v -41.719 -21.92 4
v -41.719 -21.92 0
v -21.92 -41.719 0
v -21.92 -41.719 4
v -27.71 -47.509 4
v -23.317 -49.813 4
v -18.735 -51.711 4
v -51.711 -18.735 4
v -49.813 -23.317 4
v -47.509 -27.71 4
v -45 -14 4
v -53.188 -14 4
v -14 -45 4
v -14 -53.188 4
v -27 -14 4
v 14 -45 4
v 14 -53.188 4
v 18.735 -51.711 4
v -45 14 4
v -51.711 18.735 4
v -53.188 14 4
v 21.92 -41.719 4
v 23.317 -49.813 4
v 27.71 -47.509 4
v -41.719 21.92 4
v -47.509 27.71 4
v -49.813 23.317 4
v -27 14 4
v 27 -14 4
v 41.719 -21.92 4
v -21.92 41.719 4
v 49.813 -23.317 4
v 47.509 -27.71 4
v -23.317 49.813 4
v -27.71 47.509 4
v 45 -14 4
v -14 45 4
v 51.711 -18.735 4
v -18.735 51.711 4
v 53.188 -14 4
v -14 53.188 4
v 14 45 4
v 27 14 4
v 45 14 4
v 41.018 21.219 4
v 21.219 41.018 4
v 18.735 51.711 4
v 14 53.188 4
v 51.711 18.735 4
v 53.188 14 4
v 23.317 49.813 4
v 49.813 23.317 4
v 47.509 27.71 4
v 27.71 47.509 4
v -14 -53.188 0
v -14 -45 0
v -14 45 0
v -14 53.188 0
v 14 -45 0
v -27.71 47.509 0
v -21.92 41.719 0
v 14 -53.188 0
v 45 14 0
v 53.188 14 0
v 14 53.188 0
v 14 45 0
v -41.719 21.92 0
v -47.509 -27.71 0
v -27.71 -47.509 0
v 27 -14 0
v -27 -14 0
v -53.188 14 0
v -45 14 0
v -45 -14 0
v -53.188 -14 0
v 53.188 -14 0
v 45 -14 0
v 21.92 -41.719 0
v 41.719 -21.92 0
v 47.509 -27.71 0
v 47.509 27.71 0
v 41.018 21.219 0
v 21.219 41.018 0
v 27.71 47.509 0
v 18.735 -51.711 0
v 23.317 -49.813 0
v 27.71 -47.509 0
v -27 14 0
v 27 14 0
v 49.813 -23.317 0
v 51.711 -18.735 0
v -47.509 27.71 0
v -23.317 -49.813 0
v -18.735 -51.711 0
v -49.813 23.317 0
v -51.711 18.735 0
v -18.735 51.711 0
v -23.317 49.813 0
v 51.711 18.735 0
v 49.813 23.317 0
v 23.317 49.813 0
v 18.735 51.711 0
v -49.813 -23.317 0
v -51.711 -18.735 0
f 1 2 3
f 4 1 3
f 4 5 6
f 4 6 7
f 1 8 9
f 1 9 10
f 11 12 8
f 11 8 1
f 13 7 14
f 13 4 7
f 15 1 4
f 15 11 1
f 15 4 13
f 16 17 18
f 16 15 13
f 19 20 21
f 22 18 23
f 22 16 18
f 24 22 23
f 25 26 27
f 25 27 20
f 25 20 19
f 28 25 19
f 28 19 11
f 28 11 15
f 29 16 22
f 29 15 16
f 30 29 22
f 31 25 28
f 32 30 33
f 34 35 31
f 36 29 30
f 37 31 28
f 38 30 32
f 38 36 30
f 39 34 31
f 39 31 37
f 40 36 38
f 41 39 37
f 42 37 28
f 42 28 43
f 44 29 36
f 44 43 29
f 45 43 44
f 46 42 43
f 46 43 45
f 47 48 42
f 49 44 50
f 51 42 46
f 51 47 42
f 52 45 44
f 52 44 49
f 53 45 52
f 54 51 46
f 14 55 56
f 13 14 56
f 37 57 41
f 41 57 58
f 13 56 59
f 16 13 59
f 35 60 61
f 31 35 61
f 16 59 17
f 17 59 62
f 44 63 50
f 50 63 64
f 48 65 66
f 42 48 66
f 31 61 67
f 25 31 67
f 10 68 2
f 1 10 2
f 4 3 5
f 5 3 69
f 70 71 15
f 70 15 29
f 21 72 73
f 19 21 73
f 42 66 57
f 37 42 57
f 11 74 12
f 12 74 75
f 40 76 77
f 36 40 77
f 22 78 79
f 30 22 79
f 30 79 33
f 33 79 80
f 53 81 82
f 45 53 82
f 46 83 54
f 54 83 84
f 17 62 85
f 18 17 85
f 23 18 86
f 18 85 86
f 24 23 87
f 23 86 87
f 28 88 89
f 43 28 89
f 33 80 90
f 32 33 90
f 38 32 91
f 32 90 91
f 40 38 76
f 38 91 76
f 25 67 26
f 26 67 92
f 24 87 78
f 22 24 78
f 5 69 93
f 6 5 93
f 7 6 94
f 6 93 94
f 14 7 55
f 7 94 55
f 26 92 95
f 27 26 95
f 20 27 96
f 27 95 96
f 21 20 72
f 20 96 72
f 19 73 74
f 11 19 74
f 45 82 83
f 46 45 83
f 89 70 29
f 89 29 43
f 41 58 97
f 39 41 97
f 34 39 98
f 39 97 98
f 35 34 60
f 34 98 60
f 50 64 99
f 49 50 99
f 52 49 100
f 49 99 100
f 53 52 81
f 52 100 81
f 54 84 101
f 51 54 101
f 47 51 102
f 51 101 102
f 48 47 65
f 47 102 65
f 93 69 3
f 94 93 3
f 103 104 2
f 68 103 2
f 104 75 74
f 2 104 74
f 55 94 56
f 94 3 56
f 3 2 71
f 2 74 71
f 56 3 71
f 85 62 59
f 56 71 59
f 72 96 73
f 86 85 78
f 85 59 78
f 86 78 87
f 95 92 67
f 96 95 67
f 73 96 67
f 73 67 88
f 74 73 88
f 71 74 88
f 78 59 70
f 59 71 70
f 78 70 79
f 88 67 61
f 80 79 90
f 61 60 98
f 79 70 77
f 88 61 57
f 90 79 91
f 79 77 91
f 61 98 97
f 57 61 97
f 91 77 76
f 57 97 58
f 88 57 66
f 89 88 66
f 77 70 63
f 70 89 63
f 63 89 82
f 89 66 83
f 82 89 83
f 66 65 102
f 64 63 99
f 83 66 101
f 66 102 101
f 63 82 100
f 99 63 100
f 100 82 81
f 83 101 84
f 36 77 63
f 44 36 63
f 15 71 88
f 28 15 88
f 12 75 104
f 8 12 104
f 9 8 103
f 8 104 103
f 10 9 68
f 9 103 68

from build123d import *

# Parameters (mm, degrees)
F0_W     = 54
F0_H     = 28
F1_DEPTH = 4


# Not quite as in the source:
# - a feature of the source that left no trace in its solid (it failed there, or was rolled back) is left out


with BuildPart() as f1:
    # F0 (on Top) → F1 (new body)
    with BuildSketch(Plane.XY):
        with BuildLine():
            Line((14, -45), (14, -53.1883445879))
            ThreePointArc((14, -53.1883445879), (21.0475887801, -50.8133742881), (27.7103442016, -47.5093340748))
            Line((27.7103442016, -47.5093340748), (21.9203102168, -41.71930009))
            Line((21.9203102168, -41.71930009), (41.71930009, -21.9203102168))
            Line((41.71930009, -21.9203102168), (47.5093340748, -27.7103442016))
            ThreePointArc((47.5093340748, -27.7103442016), (50.8133742881, -21.0475887801), (53.1883445879, -14))
            Line((53.1883445879, -14), (45, -14))
            Line((45, -14), (45, 14))
            Line((45, 14), (53.1883445879, 14))
            ThreePointArc((53.1883445879, 14), (50.8133742881, 21.0475887801), (47.5093340748, 27.7103442016))
            Line((47.5093340748, 27.7103442016), (41.0177921349, 21.2188022616))
            Line((41.0177921349, 21.2188022616), (21.2188022616, 41.0177921349))
            Line((21.2188022616, 41.0177921349), (27.7103442016, 47.5093340748))
            ThreePointArc((27.7103442016, 47.5093340748), (21.0475887801, 50.8133742881), (14, 53.1883445879))
            Line((14, 53.1883445879), (14, 45))
            Line((14, 45), (-14, 45))
            Line((-14, 45), (-14, 53.1883445879))
            ThreePointArc((-14, 53.1883445879), (-21.0475887801, 50.8133742881), (-27.7103442016, 47.5093340748))
            Line((-27.7103442016, 47.5093340748), (-21.9203102168, 41.71930009))
            Line((-21.9203102168, 41.71930009), (-41.71930009, 21.9203102168))
            Line((-41.71930009, 21.9203102168), (-47.5093340748, 27.7103442016))
            ThreePointArc((-47.5093340748, 27.7103442016), (-50.8133742881, 21.0475887801), (-53.1883445879, 14))
            Line((-53.1883445879, 14), (-45, 14))
            Line((-45, 14), (-45, -14))
            Line((-45, -14), (-53.1883445879, -14))
            ThreePointArc((-53.1883445879, -14), (-50.8133742881, -21.0475887801), (-47.5093340748, -27.7103442016))
            Line((-47.5093340748, -27.7103442016), (-41.71930009, -21.9203102168))
            Line((-41.71930009, -21.9203102168), (-21.9203102168, -41.71930009))
            Line((-21.9203102168, -41.71930009), (-27.7103442016, -47.5093340748))
            ThreePointArc((-27.7103442016, -47.5093340748), (-21.0475887801, -50.8133742881), (-14, -53.1883445879))
            Line((-14, -53.1883445879), (-14, -45))
            Line((-14, -45), (14, -45))
        make_face()
        Rectangle(F0_W, F0_H, mode=Mode.SUBTRACT)
    extrude(amount=F1_DEPTH)


solid = f1.part
